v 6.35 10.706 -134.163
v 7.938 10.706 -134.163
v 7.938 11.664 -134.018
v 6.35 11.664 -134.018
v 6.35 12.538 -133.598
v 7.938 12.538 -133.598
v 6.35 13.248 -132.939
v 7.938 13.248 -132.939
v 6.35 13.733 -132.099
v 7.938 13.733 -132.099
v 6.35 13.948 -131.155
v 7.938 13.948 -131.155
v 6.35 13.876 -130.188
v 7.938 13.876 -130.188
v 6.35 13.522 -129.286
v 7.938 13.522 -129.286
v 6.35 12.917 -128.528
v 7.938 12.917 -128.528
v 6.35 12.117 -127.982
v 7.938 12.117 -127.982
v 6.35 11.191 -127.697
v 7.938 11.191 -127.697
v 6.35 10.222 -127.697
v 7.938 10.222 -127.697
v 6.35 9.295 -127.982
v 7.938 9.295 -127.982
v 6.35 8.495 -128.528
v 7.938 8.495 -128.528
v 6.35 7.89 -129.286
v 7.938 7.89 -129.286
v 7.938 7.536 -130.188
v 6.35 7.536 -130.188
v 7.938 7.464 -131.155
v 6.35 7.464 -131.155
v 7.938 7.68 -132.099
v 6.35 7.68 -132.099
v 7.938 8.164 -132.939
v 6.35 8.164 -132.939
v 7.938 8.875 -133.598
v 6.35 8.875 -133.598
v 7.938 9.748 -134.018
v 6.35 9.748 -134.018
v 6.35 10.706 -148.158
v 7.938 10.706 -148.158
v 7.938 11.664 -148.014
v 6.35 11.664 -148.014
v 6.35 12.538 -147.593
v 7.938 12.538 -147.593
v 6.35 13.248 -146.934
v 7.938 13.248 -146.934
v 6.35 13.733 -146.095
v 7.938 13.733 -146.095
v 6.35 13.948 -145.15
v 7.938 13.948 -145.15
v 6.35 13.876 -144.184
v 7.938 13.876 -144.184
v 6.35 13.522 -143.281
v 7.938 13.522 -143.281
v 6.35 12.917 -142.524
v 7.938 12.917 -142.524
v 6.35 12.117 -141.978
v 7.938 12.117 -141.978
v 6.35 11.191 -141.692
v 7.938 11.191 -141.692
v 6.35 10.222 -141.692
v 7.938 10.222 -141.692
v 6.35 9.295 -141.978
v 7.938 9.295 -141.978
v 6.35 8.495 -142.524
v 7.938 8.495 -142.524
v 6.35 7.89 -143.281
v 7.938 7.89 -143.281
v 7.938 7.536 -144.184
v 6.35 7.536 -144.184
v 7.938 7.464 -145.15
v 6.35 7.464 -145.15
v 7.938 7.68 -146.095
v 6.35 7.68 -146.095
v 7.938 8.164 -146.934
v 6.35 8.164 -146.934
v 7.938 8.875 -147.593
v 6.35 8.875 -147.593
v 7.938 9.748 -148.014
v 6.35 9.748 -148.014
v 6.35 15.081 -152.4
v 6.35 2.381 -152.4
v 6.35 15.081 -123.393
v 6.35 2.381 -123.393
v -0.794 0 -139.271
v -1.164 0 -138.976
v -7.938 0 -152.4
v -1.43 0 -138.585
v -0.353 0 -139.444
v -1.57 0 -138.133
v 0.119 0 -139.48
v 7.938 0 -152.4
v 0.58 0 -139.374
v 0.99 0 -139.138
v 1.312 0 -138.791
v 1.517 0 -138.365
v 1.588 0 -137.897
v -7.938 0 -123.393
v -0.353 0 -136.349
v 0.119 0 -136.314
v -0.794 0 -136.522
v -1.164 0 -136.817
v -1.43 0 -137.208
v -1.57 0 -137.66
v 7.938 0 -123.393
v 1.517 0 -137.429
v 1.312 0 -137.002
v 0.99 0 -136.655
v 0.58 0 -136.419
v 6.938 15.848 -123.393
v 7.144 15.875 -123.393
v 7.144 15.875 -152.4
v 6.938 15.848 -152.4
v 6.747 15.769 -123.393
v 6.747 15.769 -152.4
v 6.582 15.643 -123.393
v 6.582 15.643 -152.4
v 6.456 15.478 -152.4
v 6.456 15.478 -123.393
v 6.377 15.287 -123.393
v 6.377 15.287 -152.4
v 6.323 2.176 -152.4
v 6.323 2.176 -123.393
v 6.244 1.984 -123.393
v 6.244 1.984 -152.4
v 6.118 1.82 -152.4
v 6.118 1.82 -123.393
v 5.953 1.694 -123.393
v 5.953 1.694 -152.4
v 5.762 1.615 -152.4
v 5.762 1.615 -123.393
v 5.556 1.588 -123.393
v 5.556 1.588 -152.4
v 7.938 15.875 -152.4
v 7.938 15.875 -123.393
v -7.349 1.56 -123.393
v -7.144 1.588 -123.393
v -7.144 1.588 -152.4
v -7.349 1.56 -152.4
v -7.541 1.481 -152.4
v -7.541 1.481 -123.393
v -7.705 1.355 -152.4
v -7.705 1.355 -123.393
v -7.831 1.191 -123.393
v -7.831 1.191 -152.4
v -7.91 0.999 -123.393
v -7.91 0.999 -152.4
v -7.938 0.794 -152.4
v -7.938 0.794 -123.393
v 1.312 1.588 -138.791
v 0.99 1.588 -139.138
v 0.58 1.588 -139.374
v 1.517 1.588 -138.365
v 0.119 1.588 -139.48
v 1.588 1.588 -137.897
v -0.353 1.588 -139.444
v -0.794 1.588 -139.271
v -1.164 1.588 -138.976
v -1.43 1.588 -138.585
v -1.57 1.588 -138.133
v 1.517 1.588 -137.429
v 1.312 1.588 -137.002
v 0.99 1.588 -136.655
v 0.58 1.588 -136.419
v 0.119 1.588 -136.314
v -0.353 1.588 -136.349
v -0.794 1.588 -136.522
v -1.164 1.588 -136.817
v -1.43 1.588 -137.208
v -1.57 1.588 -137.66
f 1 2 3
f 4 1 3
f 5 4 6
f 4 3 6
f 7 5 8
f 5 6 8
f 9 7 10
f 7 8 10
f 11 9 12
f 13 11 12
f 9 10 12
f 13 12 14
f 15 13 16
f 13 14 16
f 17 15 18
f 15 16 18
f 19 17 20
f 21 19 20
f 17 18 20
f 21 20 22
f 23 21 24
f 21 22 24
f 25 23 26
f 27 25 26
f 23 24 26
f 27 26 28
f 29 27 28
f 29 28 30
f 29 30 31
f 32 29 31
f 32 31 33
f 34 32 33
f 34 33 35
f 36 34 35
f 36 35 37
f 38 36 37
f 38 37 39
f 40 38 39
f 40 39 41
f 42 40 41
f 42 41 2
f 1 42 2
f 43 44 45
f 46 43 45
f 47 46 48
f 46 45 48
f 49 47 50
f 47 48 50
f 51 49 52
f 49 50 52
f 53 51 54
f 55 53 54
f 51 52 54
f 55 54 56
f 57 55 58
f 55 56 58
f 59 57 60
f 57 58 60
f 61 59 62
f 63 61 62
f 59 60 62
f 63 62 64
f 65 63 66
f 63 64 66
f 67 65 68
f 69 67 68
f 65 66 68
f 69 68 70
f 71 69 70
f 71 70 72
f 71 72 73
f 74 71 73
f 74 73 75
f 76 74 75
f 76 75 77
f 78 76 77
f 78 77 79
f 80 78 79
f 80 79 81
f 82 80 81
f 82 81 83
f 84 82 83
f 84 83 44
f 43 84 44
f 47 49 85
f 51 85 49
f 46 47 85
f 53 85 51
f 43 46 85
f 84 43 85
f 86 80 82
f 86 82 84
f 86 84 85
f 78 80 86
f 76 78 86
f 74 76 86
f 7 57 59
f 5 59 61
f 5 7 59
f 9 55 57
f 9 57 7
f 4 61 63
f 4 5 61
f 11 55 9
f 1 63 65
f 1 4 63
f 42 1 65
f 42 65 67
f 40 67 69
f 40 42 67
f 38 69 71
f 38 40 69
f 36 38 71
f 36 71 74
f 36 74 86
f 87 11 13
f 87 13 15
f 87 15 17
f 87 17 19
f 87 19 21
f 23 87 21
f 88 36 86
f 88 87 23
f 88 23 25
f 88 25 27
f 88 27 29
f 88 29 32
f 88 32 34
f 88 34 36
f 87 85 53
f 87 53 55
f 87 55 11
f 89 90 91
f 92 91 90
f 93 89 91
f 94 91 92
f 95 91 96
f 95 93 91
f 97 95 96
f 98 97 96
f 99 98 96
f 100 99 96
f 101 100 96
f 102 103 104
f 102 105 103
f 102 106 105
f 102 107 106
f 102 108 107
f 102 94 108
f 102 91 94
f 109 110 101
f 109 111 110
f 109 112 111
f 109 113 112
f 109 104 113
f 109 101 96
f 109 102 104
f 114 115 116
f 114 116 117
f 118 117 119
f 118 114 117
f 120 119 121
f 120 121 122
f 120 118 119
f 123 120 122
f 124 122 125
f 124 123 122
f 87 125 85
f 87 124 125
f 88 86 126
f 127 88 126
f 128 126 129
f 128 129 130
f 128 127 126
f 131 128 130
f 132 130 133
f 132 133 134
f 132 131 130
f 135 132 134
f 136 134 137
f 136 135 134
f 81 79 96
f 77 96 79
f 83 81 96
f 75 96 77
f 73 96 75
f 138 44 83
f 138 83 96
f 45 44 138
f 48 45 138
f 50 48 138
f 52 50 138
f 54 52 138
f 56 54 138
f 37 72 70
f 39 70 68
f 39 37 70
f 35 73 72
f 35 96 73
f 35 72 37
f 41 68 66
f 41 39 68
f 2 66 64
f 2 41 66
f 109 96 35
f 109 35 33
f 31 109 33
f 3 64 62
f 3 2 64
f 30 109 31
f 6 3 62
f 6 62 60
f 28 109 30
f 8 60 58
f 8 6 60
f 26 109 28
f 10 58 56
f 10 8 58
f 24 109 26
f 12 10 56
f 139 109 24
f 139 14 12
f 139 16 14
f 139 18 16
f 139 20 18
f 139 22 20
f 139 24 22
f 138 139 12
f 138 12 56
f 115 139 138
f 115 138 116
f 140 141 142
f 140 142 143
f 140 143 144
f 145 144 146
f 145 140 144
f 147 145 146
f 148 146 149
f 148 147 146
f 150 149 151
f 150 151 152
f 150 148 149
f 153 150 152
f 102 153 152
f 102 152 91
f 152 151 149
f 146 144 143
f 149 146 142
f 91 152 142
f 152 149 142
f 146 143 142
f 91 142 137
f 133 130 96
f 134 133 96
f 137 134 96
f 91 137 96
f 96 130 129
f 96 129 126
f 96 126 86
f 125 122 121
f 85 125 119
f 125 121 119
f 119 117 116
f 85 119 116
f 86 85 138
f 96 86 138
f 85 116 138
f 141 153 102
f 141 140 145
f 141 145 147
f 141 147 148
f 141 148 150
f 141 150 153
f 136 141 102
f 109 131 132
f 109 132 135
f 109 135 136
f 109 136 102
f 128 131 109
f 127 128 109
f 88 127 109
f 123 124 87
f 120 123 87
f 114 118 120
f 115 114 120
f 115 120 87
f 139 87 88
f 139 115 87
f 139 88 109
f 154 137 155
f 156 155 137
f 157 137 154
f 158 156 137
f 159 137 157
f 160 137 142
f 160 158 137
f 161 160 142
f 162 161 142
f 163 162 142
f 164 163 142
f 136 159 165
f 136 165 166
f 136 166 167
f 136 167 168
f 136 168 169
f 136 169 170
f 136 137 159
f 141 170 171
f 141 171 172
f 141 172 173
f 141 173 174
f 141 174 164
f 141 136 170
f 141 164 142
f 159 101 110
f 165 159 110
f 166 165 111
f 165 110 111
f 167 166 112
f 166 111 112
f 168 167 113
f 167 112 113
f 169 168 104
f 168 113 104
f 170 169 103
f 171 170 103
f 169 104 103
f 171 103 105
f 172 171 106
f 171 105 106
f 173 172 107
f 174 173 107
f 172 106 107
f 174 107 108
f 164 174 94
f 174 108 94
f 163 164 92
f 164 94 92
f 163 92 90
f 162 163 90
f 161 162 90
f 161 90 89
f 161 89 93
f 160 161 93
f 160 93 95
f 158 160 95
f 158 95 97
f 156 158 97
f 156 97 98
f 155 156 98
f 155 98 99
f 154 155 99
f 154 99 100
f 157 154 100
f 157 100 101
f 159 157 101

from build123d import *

# Parameters (mm, degrees)
BOSS_EXTRUDE1_DEPTH = 152.4
CUT_EXTRUDE1_REACH  = 17.875
SKETCH3_R           = 3.2512
CUT_EXTRUDE2_START  = -275.7932
CUT_EXTRUDE2_DEPTH  = 275.7932
CUT_EXTRUDE3_REACH  = 17.875
SKETCH5_R           = 1.5875


with BuildPart() as part:
    # Sketch2 → Boss-Extrude1 (new body, symmetric)
    with BuildSketch(Plane.XY):
        with BuildLine():
            Line((-7.9375, 0), (7.9375, 0))
            Line((7.9375, 0), (7.9375, 15.875))
            Line((7.9375, 15.875), (7.14375, 15.875))
            ThreePointArc((7.14375, 15.875), (6.582483992, 15.642516008), (6.35, 15.08125))
            Line((6.35, 15.08125), (6.35, 2.38125))
            ThreePointArc((6.35, 2.38125), (6.117516008, 1.819983992), (5.55625, 1.5875))
            Line((5.55625, 1.5875), (-7.14375, 1.5875))
            ThreePointArc((-7.14375, 1.5875), (-7.705016008, 1.355016008), (-7.9375, 0.79375))
            Line((-7.9375, 0.79375), (-7.9375, 0))
        make_face()
    extrude(amount=BOSS_EXTRUDE1_DEPTH, both=True)

    # Sketch3 → Cut-Extrude1 (cut, up to next)
    with BuildSketch(Plane(origin=(7.9375, 0, 0), x_dir=(0, 0, -1), z_dir=(1, 0, 0)), mode=Mode.PRIVATE) as cut_extrude1_sk1:
        with Locations((144.907, 10.7061)):
            Circle(SKETCH3_R)
    cut_extrude1_tool1 = extrude(cut_extrude1_sk1.sketch, amount=-CUT_EXTRUDE1_REACH, mode=Mode.PRIVATE) & part.part
    add(cut_extrude1_tool1.solids().sort_by_distance((7.9375, 10.7061, -144.907))[0], mode=Mode.SUBTRACT)
    # Sketch3 → Cut-Extrude1 (cut, up to next)
    with BuildSketch(Plane(origin=(7.9375, 0, 0), x_dir=(0, 0, -1), z_dir=(1, 0, 0)), mode=Mode.PRIVATE) as cut_extrude1_sk2:
        with Locations((130.9116, 10.7061)):
            Circle(SKETCH3_R)
    cut_extrude1_tool2 = extrude(cut_extrude1_sk2.sketch, amount=-CUT_EXTRUDE1_REACH, mode=Mode.PRIVATE) & part.part
    add(cut_extrude1_tool2.solids().sort_by_distance((7.9375, 10.7061, -130.9116))[0], mode=Mode.SUBTRACT)

    # Sketch4 → Cut-Extrude2 (cut)
    with BuildSketch(Plane.XY.offset(152.4).offset(CUT_EXTRUDE2_START)):
        with BuildLine():
            Line((-7.9375, 0.79375), (-7.9375, 0))
            Line((-7.9375, 0), (7.9375, 0))
            Line((7.9375, 0), (7.9375, 15.875))
            Line((7.9375, 15.875), (7.14375, 15.875))
            ThreePointArc((7.14375, 15.875), (6.582483992, 15.642516008), (6.35, 15.08125))
            Line((6.35, 15.08125), (6.35, 2.38125))
            ThreePointArc((6.35, 2.38125), (6.117516008, 1.819983992), (5.55625, 1.5875))
            Line((5.55625, 1.5875), (-7.14375, 1.5875))
            ThreePointArc((-7.14375, 1.5875), (-7.705016008, 1.355016008), (-7.9375, 0.79375))
        make_face()
    extrude(amount=CUT_EXTRUDE2_DEPTH, mode=Mode.SUBTRACT)

    # Sketch5 → Cut-Extrude3 (cut, up to next)
    with BuildSketch(Plane.XZ, mode=Mode.PRIVATE) as cut_extrude3_sk1:
        with Locations((0, -137.8966)):
            Circle(SKETCH5_R)
    cut_extrude3_tool1 = extrude(cut_extrude3_sk1.sketch, amount=-CUT_EXTRUDE3_REACH, mode=Mode.PRIVATE) & part.part
    add(cut_extrude3_tool1.solids().sort_by_distance((0, 0, -137.8966))[0], mode=Mode.SUBTRACT)


solid = part.part
